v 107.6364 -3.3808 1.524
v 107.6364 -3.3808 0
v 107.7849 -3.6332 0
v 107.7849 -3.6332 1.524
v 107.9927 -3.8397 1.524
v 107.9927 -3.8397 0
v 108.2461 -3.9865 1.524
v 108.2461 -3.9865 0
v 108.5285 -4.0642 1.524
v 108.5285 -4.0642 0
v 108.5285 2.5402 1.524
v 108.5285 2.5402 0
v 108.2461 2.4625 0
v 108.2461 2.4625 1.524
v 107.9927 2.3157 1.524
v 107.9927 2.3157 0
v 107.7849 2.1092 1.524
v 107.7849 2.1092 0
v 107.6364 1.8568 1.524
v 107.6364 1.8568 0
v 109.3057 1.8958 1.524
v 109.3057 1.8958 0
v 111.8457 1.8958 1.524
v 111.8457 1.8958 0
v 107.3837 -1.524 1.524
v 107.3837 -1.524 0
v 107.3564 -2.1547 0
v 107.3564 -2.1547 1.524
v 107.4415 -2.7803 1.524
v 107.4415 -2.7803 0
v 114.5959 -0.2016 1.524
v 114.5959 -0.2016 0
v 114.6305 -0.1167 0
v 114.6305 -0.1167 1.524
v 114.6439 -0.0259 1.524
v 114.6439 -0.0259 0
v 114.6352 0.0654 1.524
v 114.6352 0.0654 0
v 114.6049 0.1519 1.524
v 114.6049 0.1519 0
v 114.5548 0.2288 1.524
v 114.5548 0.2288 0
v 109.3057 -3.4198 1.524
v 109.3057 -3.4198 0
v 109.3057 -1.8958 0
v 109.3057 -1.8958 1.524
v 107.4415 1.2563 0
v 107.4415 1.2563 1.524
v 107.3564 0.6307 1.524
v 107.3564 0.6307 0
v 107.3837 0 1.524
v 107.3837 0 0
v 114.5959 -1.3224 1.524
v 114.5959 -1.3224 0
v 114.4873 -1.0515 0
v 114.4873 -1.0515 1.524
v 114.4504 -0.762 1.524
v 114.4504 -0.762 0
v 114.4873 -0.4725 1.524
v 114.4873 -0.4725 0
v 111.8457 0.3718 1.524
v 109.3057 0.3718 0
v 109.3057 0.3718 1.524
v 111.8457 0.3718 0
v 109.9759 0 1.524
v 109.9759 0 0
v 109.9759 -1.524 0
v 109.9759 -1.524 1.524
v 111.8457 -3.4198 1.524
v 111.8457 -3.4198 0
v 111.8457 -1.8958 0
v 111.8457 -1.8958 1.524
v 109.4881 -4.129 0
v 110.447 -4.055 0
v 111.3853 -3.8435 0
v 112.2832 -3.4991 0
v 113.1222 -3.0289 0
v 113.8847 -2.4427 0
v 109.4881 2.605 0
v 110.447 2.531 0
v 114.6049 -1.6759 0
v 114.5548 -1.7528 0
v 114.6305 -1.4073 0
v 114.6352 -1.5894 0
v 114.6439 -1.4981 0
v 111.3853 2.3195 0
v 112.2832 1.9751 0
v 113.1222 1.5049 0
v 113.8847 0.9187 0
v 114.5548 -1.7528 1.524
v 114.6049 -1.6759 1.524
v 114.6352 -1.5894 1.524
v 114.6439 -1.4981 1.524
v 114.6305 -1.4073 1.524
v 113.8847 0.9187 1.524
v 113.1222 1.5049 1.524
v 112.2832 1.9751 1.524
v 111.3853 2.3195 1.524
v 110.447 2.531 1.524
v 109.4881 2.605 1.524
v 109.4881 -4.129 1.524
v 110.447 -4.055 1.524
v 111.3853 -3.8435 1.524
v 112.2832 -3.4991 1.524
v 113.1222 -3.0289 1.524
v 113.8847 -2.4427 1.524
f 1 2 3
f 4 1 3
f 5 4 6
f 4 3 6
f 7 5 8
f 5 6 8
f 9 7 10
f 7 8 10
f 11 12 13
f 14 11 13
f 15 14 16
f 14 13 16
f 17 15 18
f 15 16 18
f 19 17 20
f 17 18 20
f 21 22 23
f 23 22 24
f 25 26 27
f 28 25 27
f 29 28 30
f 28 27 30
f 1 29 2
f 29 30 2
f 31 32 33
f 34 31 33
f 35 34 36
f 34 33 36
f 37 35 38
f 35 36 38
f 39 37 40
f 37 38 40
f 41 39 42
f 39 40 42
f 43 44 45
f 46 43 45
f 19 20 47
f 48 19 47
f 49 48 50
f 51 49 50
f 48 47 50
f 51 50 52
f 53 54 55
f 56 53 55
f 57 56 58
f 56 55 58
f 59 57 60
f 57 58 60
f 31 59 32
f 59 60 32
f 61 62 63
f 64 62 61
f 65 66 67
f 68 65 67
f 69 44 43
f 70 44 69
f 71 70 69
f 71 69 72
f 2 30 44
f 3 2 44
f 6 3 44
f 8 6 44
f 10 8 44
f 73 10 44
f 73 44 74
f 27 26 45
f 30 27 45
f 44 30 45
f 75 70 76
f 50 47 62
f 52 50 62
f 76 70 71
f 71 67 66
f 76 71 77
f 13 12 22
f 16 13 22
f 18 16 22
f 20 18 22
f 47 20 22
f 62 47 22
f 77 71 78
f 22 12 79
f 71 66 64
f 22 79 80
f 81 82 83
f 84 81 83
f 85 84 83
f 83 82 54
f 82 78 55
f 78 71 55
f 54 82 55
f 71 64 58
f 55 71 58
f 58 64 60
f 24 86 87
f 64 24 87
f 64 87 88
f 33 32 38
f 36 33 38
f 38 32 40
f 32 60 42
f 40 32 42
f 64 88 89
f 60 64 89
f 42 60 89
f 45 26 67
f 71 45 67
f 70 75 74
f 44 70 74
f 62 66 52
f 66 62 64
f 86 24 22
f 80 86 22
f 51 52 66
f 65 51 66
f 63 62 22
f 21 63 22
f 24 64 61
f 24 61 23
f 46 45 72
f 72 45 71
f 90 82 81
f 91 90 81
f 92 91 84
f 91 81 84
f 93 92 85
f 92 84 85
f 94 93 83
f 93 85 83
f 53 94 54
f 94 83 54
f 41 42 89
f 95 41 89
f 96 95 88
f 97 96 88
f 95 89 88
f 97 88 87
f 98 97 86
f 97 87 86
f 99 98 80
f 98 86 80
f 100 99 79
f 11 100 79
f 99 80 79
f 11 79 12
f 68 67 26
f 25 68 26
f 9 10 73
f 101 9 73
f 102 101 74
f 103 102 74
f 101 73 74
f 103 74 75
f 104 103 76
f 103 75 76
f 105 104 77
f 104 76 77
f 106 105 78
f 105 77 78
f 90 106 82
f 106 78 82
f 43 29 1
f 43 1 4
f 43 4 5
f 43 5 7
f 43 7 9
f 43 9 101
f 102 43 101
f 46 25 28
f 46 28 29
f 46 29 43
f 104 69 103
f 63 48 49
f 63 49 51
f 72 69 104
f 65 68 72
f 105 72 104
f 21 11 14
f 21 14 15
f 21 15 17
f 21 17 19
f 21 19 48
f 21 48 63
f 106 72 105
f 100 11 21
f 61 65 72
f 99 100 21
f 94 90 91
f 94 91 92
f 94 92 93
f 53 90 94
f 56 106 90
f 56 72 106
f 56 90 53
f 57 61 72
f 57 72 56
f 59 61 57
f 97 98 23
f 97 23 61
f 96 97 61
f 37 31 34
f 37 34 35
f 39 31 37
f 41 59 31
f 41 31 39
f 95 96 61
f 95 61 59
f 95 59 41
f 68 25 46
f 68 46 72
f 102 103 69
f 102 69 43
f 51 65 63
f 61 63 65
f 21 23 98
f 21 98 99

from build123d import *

# Parameters (mm, degrees)
SKETCH1_W           = 2.54
SKETCH1_H           = 1.524
BOSS_EXTRUDE1_DEPTH = 1.524


with BuildPart() as part:
    # Sketch1 → Boss-Extrude1 (new body)
    with BuildSketch(Plane.XY):
        with BuildLine():
            Line((109.975938606, -1.524), (107.383711033, -1.524))
            ThreePointArc((107.383711033, -1.524), (107.384970604, -2.46941588), (107.636449137, -3.380772737))
            ThreePointArc((107.636449137, -3.380772737), (107.992708895, -3.839670187), (108.528537329, -4.064160218))
            ThreePointArc((108.528537329, -4.064160218), (111.840473047, -3.687536777), (114.554773872, -1.752766908))
            ThreePointArc((114.554773872, -1.752766908), (114.642277966, -1.543971247), (114.595869935, -1.322388556))
            ThreePointArc((114.595869935, -1.322388556), (114.450356485, -0.762), (114.595869935, -0.201611444))
            ThreePointArc((114.595869935, -0.201611444), (114.642277966, 0.019971247), (114.554773872, 0.228766908))
            ThreePointArc((114.554773872, 0.228766908), (111.840473047, 2.163536777), (108.528537329, 2.540160218))
            ThreePointArc((108.528537329, 2.540160218), (107.992708895, 2.315670187), (107.636449137, 1.856772737))
            ThreePointArc((107.636449137, 1.856772737), (107.384970604, 0.94541588), (107.383711033, 0))
            Line((107.383711033, 0), (109.975938606, 0))
            Line((109.975938606, 0), (109.975938606, -1.524))
        make_face()
        with Locations((110.575658384, 1.133758123)):
            Rectangle(SKETCH1_W, SKETCH1_H, mode=Mode.SUBTRACT)
        with Locations((110.575658384, -2.657758123)):
            Rectangle(SKETCH1_W, SKETCH1_H, mode=Mode.SUBTRACT)
    extrude(amount=BOSS_EXTRUDE1_DEPTH)


solid = part.part
